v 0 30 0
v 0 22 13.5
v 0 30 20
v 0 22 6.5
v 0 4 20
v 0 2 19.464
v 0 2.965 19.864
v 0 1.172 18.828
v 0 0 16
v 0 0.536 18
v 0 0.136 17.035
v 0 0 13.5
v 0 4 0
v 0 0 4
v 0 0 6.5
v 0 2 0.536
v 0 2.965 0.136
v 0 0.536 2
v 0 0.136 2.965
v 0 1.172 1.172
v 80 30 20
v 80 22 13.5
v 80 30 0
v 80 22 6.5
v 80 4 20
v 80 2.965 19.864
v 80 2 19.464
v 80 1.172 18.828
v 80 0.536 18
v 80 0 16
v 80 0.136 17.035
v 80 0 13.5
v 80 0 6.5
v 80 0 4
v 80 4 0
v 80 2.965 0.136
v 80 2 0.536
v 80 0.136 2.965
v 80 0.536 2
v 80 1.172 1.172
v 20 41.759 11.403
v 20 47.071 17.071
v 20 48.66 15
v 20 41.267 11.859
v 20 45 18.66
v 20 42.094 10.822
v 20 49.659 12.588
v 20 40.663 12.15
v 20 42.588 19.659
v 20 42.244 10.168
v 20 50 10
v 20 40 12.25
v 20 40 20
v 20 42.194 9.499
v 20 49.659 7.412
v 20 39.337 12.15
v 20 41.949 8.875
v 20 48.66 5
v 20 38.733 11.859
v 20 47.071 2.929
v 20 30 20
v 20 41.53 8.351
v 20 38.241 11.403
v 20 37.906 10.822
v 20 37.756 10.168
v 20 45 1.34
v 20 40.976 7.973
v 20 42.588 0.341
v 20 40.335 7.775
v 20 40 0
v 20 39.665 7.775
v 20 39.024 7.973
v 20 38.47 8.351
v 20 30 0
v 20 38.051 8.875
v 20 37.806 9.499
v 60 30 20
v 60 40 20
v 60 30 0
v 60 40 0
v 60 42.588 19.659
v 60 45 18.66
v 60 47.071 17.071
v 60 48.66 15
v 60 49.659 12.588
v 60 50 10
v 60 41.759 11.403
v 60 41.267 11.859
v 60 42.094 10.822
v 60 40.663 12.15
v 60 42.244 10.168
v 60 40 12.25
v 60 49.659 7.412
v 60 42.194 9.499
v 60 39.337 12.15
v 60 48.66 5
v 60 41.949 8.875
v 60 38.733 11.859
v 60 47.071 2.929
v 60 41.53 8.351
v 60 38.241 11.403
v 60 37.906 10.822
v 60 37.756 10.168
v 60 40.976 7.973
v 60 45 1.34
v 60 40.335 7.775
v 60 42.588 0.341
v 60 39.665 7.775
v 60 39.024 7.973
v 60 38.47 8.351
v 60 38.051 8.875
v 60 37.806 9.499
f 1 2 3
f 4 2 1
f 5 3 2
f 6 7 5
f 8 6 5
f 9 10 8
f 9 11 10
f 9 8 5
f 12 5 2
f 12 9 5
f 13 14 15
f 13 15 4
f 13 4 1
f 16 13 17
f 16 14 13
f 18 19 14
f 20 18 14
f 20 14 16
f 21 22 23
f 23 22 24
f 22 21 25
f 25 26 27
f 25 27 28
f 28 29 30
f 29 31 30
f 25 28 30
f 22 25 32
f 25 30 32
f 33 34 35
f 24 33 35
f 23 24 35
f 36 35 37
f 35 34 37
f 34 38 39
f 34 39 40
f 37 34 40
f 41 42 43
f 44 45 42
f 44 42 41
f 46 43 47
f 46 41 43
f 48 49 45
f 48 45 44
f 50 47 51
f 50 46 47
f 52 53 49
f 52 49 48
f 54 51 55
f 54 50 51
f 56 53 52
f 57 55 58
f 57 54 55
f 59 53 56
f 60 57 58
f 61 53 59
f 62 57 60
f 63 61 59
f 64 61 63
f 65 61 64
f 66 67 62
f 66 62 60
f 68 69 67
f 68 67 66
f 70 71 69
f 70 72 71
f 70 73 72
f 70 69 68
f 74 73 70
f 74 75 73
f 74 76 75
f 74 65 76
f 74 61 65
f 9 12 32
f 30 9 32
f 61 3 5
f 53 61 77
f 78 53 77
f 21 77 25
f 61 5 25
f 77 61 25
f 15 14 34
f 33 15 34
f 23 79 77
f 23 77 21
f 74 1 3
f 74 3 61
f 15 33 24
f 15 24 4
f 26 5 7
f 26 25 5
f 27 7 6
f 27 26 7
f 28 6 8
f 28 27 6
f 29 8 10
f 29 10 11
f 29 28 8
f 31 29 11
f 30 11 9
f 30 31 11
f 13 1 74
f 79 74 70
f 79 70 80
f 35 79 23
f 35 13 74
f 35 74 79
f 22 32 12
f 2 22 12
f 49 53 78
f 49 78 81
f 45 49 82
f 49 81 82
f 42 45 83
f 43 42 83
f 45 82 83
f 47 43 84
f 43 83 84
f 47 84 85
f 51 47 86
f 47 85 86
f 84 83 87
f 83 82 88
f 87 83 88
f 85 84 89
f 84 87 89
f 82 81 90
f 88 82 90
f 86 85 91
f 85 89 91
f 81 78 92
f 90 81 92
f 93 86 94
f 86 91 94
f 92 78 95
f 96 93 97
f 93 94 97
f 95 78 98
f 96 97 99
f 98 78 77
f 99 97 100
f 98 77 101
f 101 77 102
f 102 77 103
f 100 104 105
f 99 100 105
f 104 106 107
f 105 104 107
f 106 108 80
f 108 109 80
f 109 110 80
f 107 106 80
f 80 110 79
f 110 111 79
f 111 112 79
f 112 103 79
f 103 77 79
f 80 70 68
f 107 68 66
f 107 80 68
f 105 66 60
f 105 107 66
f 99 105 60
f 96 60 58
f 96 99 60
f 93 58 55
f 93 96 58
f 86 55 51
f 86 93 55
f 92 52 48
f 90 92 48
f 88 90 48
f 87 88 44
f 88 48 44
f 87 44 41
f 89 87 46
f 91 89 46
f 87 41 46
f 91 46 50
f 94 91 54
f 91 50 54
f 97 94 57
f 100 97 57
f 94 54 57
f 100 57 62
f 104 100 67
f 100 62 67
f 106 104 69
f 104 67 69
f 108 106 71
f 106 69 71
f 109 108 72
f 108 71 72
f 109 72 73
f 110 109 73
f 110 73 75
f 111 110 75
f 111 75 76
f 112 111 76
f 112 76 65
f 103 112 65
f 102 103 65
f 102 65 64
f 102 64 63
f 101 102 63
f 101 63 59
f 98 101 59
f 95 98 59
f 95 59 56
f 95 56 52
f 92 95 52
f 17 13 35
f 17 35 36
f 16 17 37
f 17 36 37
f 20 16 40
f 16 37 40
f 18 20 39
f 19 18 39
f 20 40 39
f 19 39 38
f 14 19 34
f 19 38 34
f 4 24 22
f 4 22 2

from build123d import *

# Parameters (mm, degrees)
SKETCH1_W           = 80
SKETCH1_H           = 20
BOSS_EXTRUDE1_DEPTH = 30
SKETCH2_W           = 80
SKETCH2_H           = 7
CUT_EXTRUDE1_DEPTH  = 22
SKETCH3_W           = 40
SKETCH3_H           = 20
BOSS_EXTRUDE2_DEPTH = 20
SKETCH4_R           = 2.25
CUT_EXTRUDE2_DEPTH  = 81.622577483
FILLET1_R           = 10
FILLET2_R           = 4


with BuildPart() as part:
    # Sketch1 → Boss-Extrude1 (new body)
    with BuildSketch(Plane(origin=(0, 0, 0), x_dir=(1, 0, 0), z_dir=(0, 1, 0))):
        with Locations((40, -10)):
            Rectangle(SKETCH1_W, SKETCH1_H)
    extrude(amount=BOSS_EXTRUDE1_DEPTH)

    # Sketch2 → Cut-Extrude1 (cut)
    with BuildSketch(Plane(origin=(0, 0, 0), x_dir=(-1, 0, 0), z_dir=(0, -1, 0))):
        with Locations((-40, -10)):
            Rectangle(SKETCH2_W, SKETCH2_H)
    extrude(amount=-CUT_EXTRUDE1_DEPTH, mode=Mode.SUBTRACT)

    # Sketch3 → Boss-Extrude2 (add)
    with BuildSketch(Plane(origin=(0, 30, 0), x_dir=(1, 0, 0), z_dir=(0, 1, 0))):
        with Locations((40, -10)):
            Rectangle(SKETCH3_W, SKETCH3_H)
    extrude(amount=BOSS_EXTRUDE2_DEPTH)

    # Sketch4 → Cut-Extrude2 (cut, through all)
    with BuildSketch(Plane.ZY.offset(-20)):
        with Locations((10, 40)):
            Circle(SKETCH4_R)
    extrude(amount=-CUT_EXTRUDE2_DEPTH, mode=Mode.SUBTRACT)

    # Fillet1
    fillet1_edges = [part.edges().sort_by_distance(p)[0] for p in [
        (40, 50, 0),
        (40, 50, 20),
    ]]
    fillet(fillet1_edges, radius=FILLET1_R - 0.0001)  # a hair under: the kernel refuses the full size

    # Fillet2
    fillet2_edges = [part.edges().sort_by_distance(p)[0] for p in [
        (40, 0, 0),
        (40, 0, 20),
    ]]
    fillet(fillet2_edges, radius=FILLET2_R)


solid = part.part
